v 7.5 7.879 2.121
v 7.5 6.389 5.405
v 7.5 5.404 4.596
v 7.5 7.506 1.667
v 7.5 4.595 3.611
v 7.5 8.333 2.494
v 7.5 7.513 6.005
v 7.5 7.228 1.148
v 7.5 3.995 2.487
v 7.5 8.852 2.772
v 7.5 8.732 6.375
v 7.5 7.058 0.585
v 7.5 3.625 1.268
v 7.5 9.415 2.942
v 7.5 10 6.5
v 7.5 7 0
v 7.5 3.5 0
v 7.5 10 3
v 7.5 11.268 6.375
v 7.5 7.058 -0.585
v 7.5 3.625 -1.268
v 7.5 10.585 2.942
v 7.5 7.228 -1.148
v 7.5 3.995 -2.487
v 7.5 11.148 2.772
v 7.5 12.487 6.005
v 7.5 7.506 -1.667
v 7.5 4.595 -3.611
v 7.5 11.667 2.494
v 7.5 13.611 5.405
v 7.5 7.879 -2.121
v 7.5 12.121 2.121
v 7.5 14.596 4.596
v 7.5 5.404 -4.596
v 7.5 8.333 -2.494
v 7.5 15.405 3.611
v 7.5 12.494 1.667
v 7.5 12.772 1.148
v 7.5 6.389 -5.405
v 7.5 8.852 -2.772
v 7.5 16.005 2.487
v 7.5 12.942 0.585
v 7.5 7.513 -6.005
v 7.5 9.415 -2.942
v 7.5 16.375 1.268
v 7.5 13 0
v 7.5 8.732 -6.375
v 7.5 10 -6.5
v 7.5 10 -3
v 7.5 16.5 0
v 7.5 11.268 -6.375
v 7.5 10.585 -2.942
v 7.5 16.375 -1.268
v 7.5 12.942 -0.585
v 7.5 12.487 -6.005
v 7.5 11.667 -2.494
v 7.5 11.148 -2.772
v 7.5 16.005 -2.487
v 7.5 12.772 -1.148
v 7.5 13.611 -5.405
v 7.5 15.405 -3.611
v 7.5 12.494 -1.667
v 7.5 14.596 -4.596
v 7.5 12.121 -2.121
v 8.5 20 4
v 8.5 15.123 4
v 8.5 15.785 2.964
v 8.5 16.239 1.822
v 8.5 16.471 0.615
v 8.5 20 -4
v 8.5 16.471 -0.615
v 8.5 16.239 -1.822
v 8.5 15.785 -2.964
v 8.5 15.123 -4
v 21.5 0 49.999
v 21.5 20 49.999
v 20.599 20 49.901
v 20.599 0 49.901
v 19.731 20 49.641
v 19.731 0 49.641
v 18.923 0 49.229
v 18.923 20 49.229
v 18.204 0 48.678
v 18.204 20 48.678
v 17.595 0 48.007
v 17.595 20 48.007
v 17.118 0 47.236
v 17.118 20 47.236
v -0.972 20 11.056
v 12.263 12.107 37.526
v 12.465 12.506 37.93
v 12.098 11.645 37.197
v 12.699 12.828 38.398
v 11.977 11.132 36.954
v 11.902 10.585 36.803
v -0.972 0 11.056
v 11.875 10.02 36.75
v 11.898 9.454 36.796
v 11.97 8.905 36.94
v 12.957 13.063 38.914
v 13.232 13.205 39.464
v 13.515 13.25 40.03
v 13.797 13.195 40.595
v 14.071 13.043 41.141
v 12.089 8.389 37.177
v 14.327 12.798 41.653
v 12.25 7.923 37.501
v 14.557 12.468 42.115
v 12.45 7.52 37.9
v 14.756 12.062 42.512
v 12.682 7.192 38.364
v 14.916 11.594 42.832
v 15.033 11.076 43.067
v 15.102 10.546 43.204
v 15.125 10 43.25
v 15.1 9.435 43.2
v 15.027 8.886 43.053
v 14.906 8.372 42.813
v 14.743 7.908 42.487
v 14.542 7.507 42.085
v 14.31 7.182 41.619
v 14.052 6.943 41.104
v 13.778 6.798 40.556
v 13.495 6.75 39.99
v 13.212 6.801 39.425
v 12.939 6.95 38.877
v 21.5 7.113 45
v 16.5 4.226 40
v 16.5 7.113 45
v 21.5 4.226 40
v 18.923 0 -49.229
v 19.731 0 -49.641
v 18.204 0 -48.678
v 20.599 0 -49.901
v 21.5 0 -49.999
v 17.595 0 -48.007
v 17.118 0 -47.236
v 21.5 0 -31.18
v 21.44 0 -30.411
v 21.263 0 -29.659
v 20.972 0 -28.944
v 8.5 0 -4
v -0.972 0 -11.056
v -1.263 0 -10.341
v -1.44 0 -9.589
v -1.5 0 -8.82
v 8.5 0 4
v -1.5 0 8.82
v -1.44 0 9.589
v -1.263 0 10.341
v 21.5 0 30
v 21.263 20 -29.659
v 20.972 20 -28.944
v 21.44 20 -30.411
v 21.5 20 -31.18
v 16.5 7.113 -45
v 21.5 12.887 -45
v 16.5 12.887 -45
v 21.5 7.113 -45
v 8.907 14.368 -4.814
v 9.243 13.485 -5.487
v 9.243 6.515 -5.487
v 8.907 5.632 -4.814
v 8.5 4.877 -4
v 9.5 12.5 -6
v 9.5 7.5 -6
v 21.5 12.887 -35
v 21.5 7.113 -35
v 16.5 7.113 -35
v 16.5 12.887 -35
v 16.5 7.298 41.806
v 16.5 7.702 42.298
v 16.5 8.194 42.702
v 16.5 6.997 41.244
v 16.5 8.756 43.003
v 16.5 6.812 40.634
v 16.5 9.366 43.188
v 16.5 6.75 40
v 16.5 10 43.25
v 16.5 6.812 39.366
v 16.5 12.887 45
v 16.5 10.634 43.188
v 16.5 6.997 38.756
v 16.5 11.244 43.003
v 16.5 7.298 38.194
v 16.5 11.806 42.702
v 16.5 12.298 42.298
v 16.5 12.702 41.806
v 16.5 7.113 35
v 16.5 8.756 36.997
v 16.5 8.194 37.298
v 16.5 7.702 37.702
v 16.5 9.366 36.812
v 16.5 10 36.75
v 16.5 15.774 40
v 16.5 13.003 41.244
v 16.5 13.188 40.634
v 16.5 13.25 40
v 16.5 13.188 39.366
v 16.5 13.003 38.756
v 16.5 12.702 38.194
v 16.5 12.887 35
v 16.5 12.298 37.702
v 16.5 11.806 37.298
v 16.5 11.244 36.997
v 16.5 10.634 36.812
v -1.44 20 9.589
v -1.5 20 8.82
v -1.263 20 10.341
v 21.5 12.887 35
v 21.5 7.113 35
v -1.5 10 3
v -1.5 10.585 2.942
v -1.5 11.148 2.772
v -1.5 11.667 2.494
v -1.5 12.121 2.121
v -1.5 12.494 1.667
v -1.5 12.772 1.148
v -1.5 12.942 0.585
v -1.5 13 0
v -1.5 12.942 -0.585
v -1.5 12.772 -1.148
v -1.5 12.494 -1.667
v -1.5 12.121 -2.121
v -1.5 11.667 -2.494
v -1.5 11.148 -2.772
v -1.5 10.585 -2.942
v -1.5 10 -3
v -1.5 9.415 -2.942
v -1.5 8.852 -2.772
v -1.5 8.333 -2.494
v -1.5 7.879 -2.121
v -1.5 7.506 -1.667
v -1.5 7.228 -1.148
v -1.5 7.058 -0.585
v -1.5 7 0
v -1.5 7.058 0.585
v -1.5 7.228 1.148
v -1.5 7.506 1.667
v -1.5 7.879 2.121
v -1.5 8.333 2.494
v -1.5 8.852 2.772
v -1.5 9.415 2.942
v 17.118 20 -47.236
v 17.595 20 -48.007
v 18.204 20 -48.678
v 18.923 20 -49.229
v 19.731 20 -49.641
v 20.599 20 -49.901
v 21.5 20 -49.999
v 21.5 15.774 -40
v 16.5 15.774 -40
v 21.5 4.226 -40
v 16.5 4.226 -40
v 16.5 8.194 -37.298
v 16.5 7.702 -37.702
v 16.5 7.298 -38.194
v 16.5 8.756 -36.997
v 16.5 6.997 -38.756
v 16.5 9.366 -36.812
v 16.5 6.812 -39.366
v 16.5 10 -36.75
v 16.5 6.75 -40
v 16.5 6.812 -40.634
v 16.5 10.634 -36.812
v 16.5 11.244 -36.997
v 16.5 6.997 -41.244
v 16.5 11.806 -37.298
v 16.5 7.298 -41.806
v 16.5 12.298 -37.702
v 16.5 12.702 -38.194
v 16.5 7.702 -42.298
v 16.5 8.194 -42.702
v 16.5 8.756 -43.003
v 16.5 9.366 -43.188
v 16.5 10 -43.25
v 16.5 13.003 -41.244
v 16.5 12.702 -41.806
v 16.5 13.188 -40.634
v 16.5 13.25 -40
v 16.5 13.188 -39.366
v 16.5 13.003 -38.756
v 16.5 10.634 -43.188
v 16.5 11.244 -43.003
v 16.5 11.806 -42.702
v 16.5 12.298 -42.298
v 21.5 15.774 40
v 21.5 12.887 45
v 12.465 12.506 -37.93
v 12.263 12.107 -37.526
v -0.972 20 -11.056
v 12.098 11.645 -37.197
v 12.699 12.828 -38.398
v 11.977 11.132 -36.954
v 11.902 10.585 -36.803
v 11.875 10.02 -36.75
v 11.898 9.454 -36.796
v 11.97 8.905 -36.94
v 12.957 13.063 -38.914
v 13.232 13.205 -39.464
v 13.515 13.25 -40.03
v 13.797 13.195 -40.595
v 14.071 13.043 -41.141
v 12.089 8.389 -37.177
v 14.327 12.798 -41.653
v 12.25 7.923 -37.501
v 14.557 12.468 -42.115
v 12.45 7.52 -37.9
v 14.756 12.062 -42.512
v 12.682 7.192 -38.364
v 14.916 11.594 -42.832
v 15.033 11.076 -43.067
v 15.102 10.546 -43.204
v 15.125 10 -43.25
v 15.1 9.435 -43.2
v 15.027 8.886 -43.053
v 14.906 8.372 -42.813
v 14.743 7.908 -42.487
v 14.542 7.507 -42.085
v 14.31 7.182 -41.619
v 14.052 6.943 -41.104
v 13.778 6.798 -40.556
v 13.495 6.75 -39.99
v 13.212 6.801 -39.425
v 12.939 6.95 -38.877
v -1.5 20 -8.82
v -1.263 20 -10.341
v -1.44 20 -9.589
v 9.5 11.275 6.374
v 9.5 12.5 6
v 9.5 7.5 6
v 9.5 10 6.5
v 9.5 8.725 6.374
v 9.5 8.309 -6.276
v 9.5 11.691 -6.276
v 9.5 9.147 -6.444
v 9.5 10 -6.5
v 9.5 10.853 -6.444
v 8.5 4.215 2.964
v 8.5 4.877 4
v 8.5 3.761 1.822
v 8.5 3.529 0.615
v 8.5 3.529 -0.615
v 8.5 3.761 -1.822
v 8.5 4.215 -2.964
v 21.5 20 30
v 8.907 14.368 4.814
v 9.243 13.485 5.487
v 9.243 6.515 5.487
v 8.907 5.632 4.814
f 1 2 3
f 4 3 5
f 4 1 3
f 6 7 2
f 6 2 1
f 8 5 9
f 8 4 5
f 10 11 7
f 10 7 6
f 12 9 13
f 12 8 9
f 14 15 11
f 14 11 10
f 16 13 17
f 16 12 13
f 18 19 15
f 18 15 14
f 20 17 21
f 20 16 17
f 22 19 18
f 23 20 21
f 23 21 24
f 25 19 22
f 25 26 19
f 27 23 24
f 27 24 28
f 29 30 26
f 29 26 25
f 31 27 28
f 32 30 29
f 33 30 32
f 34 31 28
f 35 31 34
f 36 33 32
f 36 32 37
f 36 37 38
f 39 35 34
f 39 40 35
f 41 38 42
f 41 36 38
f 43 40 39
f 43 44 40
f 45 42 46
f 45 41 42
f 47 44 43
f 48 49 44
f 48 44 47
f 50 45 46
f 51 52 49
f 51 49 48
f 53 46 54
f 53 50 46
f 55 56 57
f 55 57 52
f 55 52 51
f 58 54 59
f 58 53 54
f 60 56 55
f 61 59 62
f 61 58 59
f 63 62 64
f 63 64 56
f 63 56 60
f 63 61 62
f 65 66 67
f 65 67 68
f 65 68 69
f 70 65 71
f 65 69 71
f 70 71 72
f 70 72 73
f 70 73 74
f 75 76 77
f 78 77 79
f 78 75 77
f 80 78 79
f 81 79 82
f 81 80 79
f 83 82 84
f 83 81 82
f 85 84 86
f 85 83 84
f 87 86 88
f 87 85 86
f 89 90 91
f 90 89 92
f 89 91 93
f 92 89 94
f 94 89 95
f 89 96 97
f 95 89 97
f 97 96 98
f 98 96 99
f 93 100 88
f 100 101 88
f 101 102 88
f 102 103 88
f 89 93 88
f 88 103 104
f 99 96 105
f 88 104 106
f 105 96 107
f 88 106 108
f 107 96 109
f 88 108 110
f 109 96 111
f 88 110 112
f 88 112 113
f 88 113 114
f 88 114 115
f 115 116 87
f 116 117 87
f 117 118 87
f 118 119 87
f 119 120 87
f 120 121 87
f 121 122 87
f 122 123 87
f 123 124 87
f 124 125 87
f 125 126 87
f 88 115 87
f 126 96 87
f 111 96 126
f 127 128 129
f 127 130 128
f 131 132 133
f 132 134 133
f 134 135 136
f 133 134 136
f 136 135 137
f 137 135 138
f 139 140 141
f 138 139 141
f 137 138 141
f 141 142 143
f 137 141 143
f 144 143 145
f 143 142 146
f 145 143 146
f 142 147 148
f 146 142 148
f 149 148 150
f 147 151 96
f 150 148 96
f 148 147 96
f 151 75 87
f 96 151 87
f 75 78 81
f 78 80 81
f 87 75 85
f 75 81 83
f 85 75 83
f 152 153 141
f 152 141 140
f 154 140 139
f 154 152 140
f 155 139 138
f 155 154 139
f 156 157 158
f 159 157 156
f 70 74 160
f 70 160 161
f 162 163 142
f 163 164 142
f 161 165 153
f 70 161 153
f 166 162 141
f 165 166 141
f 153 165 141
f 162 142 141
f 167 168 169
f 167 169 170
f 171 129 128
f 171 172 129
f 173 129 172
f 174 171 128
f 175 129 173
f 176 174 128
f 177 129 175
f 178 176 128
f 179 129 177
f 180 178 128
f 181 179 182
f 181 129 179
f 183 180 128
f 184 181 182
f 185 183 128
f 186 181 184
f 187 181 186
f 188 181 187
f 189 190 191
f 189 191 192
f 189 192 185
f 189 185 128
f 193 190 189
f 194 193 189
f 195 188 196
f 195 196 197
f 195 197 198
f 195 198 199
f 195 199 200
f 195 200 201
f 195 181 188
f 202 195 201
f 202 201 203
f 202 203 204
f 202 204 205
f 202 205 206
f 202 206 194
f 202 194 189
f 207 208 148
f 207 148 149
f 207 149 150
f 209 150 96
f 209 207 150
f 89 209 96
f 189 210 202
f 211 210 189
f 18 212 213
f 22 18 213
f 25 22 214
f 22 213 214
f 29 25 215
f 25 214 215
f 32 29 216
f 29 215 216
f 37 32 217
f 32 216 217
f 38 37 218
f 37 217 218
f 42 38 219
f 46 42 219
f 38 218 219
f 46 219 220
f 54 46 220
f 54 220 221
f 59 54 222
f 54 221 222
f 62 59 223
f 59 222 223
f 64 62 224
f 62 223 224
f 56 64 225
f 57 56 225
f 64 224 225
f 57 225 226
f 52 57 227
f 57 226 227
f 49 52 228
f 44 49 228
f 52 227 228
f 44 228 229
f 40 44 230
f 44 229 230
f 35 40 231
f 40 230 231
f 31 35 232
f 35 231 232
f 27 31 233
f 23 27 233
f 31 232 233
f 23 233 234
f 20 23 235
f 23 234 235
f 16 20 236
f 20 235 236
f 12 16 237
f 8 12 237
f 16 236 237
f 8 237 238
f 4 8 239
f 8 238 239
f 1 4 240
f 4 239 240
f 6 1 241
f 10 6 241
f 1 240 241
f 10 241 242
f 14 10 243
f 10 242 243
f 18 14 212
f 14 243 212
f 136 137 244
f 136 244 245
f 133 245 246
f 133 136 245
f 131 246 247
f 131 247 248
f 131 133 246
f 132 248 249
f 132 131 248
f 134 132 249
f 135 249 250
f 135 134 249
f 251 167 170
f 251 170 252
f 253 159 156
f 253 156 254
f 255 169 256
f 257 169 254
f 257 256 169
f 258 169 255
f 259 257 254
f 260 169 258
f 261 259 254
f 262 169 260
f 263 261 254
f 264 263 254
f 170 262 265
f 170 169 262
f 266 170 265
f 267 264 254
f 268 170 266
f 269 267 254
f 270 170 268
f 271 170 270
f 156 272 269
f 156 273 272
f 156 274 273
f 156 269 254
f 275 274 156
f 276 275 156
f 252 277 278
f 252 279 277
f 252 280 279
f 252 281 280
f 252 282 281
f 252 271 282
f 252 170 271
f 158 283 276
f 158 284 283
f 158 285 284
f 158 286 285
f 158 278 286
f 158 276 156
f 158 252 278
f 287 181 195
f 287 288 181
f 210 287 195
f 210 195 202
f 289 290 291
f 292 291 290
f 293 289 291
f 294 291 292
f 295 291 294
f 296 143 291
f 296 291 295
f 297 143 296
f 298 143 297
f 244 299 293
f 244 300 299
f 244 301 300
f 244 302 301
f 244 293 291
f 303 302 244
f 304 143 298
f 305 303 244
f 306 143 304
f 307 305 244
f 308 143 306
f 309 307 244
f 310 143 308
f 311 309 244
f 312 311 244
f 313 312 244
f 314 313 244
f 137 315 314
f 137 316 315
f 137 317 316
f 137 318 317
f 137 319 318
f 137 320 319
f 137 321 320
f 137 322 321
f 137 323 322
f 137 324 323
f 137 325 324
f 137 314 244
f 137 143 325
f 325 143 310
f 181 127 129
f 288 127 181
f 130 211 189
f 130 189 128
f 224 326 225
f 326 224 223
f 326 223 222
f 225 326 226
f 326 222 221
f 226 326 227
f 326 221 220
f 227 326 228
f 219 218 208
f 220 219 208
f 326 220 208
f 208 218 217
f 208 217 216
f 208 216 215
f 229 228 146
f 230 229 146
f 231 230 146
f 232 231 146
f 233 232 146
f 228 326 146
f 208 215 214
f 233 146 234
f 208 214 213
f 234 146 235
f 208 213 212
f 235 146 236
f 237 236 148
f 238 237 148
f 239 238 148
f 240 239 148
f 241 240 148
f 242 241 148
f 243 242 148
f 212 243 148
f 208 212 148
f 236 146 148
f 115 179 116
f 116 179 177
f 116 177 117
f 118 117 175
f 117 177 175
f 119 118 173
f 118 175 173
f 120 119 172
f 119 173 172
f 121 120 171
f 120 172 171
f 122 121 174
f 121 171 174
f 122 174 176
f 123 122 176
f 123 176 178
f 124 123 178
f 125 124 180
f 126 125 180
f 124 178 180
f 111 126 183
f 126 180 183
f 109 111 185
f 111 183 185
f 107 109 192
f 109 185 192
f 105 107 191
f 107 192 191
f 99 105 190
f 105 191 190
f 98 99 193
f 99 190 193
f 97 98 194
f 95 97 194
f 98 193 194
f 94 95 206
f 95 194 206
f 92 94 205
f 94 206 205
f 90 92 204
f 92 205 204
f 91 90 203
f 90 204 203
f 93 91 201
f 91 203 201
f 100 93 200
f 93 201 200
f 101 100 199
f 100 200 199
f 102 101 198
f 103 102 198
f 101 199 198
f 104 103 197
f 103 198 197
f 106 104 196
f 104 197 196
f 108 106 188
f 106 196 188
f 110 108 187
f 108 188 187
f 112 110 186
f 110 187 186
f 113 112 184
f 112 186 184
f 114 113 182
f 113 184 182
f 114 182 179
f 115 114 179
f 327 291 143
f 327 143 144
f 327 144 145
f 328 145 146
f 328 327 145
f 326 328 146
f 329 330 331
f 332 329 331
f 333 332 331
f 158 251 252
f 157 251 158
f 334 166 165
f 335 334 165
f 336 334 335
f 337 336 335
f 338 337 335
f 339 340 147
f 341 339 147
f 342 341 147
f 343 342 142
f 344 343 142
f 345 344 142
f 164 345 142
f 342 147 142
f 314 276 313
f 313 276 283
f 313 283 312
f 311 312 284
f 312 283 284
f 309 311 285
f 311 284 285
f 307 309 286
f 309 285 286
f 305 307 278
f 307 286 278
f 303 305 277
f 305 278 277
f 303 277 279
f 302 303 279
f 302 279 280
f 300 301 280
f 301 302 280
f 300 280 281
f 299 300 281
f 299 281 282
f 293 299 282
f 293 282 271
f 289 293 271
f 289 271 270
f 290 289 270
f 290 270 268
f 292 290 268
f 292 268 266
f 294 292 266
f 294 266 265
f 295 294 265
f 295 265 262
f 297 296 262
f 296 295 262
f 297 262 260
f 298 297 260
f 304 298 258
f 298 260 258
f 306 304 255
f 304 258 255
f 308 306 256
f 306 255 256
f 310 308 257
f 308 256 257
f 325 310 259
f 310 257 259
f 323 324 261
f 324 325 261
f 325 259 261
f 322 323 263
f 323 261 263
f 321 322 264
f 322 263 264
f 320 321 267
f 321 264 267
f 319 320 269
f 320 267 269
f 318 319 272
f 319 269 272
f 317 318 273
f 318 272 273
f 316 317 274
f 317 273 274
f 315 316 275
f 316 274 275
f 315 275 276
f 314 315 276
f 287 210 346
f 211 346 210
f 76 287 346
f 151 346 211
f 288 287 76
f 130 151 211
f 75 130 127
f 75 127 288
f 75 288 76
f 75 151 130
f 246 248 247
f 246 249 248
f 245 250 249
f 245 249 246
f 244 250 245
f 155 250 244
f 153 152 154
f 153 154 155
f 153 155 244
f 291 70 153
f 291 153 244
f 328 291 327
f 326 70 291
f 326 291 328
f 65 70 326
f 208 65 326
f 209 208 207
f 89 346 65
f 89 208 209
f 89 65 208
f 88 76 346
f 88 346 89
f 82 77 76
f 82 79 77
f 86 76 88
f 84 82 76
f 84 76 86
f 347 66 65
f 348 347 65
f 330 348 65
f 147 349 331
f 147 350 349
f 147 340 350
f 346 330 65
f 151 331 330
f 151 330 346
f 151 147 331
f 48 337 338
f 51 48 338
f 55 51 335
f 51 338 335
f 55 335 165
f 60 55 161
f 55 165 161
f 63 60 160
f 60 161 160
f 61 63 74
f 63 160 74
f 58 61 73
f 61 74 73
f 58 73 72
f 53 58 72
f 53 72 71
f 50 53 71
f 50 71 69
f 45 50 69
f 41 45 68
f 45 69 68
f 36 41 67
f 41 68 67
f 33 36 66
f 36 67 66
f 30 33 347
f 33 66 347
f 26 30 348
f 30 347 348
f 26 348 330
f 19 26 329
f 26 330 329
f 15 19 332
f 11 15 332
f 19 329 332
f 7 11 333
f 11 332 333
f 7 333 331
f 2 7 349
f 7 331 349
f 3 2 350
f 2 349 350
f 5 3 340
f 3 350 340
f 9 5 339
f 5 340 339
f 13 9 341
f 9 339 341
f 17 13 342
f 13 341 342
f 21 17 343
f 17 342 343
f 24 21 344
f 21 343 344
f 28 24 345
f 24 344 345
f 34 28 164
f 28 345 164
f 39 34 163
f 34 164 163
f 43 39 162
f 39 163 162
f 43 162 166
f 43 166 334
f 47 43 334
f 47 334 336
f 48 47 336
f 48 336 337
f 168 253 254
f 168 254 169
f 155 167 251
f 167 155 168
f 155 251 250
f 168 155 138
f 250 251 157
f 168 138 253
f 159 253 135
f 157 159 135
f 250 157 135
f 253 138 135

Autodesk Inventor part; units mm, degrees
ref_plane "YZ Plane" through (0, 0, 0) normal (1, 0, 0) x (0, 1, 0)
ref_plane "XZ Plane" through (0, 0, 0) normal (0, 1, 0) x (-1, 0, 0)
ref_plane "XY Plane" through (0, 0, 0) normal (0, 0, 1) x (1, 0, 0)
sketch "Sketch1" plane through (0, 0, 0) normal (0, 1, 0) x (-1, 0, 0)
  line L0 (0, 0) -> (-20, 0)
  line L1 (-20, 0) -> (-20, -40)
  line L2 (-20, -40) -> (0, 0)
  line L3 (-21.5, -50) -> (-18.5, -50)
  line L4 (-18.5, -50) -> (-18.5, -30)
  line L5 (-18.5, -30) -> (-21.5, -30)
  line L6 (-21.5, -30) -> (-21.5, -50)
  line L7 (-21.5, -50) -> (-18.5, -30) construction
  line L8 (-18.5, -50) -> (-21.5, -30) construction
  line L9 (1.5, 10) -> (-1.5, 10)
  line L10 (-1.5, 10) -> (-1.5, -10)
  line L11 (-1.5, -10) -> (1.5, -10)
  line L12 (1.5, -10) -> (1.5, 10)
  line L13 (1.5, 10) -> (-1.5, -10) construction
  line L14 (-1.5, 10) -> (1.5, -10) construction
  line L15 (-1.5, 10) -> (-21.5, -30)
  line L16 (1.5, -10) -> (-18.5, -50)
  line L17 (1.5, -10) -> (1.5, 10)
  line L18 (1.5, -10) -> (1.5, 10)
  line L19 (1.5, 10) -> (-8.5, 10)
  line L20 (-8.5, 10) -> (-8.5, -10)
  line L21 (-8.5, -10) -> (1.5, -10)
  line L22 (1.5, -10) -> (1.5, 10)
  line L23 (0, 0) -> (10, 0)
  line L24 (0, 0) -> (10, 0) construction
  line L25 (-20, 40) -> (0, 0)
  line L26 (-21.5, 50) -> (-18.5, 50)
  line L27 (-18.5, 50) -> (-18.5, 30)
  line L28 (-18.5, 30) -> (-21.5, 30)
  line L29 (-21.5, 30) -> (-21.5, 50)
  line L30 (-1.5, -10) -> (-1.5, 10)
  line L31 (-1.5, 10) -> (1.5, 10)
  line L32 (-1.5, -10) -> (-21.5, 30)
  line L33 (1.5, 10) -> (-18.5, 50)
  line L34 (1.5, 10) -> (1.5, -10)
  point P0 (-7.3579, -1.7157)
  point P1 (-11.5, -10)
  point P2 (-11.5, -10)
  point P3 (-8.5, -4)
  point P4 (-8.5, 4)
  dimension "d0" = 20
  dimension "d1" = 40
  dimension "d2" = 3
  dimension "d3" = 20
  dimension "d4" = 3
  dimension "d5" = 20
  dimension "d31" = 10
  dimension "d32" = 20
  dimension "d42" = 10
  dimension "d43" = 0
extrude "Extrusion1" add sketch "Sketch1" along normal blind 20 contours L2 L10 L0 | L23 L12 L11 L10 L2 | L25 L10 L9 L12 L23 | L0 L10 L25 | L10 L2 L32 L0 | L0 L15 L25 L10 | L10 L32 L2 | L25 L15 L10 | L15 L20 L0 | L32 L20 L19 L25 L15 | L32 L2 L21 L20 L15 | L0 L20 L32 | L32 L21 L2 | L11 L16 L4 L2 L21 | L9 L19 L25 L27 L33 | L15 L25 L19 | L20 L21 L2 L4 L5 L1 L15 | L32 L28 L27 L25 L19 L20 | L3 L6 L5 L1 L2 L4 | L27 L28 L29 L26 | L1 L5 L15 | L2 L1 L5 L4
sketch "Sketch2" plane through (-1.5, 0, -10) normal (-1, 0, 0) x (0, 0, 1)
  circle A0 centre (10, 10) radius 3
  line L0 (0, 0) -> (20, 0) projected
  line L1 (20, 0) -> (20, 20) projected
  point P0 (10, 0)
  dimension "d8" = 6
  dimension "d9" = 10
  dimension "d44" = 10
sketch "Sketch3" plane through (21.5, 0, -30) normal (1, 0, 0) x (0, 0, -1)
  circle A0 centre (10, 10) radius 3.25
  line L0 (0, 20) -> (20, 20) projected
  line L1 (20, 0) -> (20, 20) projected
  point P0 (-30, 0)
  dimension "d11" = 6.5
  dimension "d12" = 10
  dimension "d13" = 10
extrude "Extrusion2" cut sketch "Sketch2" against normal through all
extrude "Extrusion3" cut sketch "Sketch3" against normal through all
sketch "Sketch4" plane through (21.5, 0, -30) normal (1, 0, 0) x (0, 0, -1)
  circle A0 centre (10, 10) radius 3.25 projected
  line L0 (10, 15.7735) -> (15, 12.8868)
  line L1 (15, 12.8868) -> (15, 7.1132)
  line L2 (15, 7.1132) -> (10, 4.2265)
  line L3 (10, 4.2265) -> (5, 7.1132)
  line L4 (5, 7.1132) -> (5, 12.8868)
  line L5 (5, 12.8868) -> (10, 15.7735)
  line L6 (20, 0) -> (20, 20) projected
  point P0 (-30, 0)
  point P1 (10, 10)
  dimension "d19" = 10
extrude "Extrusion4" cut sketch "Sketch4" against normal blind 5
fillet "Fillet2" radius 5 1 edges at (21.5, 10, -30)
mirror "Mirror1" about plane through (0, 0, 0) normal (0, 0, 1) of "Extrusion4", "Extrusion3"
sketch "Sketch7" plane through (8.5, 0, 4) normal (1, 0, 0) x (0, 0, -1)
  circle A0 centre (4, 10) radius 3 projected
  circle A1 centre (4, 10) radius 6.5
  point P0 (4, 0)
  dimension "d52" = 13
extrude "Extrusion6" cut sketch "Sketch7" along normal mid plane 2 contours A0 | A1
fillet "Fillet8" radius 5 2 edges at (-1.5, 10, 10) (-1.5, 10, -10)
fillet "Fillet9" radius 5 2 edges at (18.5, 10, 50) (18.5, 10, -50)
ref_plane "Work Plane1" through (0, 0, 0) normal (0, 0, 1) x (1, 0, 0)
properties part number "Bottom_Foot_Standoff" material "PET Plastic"
